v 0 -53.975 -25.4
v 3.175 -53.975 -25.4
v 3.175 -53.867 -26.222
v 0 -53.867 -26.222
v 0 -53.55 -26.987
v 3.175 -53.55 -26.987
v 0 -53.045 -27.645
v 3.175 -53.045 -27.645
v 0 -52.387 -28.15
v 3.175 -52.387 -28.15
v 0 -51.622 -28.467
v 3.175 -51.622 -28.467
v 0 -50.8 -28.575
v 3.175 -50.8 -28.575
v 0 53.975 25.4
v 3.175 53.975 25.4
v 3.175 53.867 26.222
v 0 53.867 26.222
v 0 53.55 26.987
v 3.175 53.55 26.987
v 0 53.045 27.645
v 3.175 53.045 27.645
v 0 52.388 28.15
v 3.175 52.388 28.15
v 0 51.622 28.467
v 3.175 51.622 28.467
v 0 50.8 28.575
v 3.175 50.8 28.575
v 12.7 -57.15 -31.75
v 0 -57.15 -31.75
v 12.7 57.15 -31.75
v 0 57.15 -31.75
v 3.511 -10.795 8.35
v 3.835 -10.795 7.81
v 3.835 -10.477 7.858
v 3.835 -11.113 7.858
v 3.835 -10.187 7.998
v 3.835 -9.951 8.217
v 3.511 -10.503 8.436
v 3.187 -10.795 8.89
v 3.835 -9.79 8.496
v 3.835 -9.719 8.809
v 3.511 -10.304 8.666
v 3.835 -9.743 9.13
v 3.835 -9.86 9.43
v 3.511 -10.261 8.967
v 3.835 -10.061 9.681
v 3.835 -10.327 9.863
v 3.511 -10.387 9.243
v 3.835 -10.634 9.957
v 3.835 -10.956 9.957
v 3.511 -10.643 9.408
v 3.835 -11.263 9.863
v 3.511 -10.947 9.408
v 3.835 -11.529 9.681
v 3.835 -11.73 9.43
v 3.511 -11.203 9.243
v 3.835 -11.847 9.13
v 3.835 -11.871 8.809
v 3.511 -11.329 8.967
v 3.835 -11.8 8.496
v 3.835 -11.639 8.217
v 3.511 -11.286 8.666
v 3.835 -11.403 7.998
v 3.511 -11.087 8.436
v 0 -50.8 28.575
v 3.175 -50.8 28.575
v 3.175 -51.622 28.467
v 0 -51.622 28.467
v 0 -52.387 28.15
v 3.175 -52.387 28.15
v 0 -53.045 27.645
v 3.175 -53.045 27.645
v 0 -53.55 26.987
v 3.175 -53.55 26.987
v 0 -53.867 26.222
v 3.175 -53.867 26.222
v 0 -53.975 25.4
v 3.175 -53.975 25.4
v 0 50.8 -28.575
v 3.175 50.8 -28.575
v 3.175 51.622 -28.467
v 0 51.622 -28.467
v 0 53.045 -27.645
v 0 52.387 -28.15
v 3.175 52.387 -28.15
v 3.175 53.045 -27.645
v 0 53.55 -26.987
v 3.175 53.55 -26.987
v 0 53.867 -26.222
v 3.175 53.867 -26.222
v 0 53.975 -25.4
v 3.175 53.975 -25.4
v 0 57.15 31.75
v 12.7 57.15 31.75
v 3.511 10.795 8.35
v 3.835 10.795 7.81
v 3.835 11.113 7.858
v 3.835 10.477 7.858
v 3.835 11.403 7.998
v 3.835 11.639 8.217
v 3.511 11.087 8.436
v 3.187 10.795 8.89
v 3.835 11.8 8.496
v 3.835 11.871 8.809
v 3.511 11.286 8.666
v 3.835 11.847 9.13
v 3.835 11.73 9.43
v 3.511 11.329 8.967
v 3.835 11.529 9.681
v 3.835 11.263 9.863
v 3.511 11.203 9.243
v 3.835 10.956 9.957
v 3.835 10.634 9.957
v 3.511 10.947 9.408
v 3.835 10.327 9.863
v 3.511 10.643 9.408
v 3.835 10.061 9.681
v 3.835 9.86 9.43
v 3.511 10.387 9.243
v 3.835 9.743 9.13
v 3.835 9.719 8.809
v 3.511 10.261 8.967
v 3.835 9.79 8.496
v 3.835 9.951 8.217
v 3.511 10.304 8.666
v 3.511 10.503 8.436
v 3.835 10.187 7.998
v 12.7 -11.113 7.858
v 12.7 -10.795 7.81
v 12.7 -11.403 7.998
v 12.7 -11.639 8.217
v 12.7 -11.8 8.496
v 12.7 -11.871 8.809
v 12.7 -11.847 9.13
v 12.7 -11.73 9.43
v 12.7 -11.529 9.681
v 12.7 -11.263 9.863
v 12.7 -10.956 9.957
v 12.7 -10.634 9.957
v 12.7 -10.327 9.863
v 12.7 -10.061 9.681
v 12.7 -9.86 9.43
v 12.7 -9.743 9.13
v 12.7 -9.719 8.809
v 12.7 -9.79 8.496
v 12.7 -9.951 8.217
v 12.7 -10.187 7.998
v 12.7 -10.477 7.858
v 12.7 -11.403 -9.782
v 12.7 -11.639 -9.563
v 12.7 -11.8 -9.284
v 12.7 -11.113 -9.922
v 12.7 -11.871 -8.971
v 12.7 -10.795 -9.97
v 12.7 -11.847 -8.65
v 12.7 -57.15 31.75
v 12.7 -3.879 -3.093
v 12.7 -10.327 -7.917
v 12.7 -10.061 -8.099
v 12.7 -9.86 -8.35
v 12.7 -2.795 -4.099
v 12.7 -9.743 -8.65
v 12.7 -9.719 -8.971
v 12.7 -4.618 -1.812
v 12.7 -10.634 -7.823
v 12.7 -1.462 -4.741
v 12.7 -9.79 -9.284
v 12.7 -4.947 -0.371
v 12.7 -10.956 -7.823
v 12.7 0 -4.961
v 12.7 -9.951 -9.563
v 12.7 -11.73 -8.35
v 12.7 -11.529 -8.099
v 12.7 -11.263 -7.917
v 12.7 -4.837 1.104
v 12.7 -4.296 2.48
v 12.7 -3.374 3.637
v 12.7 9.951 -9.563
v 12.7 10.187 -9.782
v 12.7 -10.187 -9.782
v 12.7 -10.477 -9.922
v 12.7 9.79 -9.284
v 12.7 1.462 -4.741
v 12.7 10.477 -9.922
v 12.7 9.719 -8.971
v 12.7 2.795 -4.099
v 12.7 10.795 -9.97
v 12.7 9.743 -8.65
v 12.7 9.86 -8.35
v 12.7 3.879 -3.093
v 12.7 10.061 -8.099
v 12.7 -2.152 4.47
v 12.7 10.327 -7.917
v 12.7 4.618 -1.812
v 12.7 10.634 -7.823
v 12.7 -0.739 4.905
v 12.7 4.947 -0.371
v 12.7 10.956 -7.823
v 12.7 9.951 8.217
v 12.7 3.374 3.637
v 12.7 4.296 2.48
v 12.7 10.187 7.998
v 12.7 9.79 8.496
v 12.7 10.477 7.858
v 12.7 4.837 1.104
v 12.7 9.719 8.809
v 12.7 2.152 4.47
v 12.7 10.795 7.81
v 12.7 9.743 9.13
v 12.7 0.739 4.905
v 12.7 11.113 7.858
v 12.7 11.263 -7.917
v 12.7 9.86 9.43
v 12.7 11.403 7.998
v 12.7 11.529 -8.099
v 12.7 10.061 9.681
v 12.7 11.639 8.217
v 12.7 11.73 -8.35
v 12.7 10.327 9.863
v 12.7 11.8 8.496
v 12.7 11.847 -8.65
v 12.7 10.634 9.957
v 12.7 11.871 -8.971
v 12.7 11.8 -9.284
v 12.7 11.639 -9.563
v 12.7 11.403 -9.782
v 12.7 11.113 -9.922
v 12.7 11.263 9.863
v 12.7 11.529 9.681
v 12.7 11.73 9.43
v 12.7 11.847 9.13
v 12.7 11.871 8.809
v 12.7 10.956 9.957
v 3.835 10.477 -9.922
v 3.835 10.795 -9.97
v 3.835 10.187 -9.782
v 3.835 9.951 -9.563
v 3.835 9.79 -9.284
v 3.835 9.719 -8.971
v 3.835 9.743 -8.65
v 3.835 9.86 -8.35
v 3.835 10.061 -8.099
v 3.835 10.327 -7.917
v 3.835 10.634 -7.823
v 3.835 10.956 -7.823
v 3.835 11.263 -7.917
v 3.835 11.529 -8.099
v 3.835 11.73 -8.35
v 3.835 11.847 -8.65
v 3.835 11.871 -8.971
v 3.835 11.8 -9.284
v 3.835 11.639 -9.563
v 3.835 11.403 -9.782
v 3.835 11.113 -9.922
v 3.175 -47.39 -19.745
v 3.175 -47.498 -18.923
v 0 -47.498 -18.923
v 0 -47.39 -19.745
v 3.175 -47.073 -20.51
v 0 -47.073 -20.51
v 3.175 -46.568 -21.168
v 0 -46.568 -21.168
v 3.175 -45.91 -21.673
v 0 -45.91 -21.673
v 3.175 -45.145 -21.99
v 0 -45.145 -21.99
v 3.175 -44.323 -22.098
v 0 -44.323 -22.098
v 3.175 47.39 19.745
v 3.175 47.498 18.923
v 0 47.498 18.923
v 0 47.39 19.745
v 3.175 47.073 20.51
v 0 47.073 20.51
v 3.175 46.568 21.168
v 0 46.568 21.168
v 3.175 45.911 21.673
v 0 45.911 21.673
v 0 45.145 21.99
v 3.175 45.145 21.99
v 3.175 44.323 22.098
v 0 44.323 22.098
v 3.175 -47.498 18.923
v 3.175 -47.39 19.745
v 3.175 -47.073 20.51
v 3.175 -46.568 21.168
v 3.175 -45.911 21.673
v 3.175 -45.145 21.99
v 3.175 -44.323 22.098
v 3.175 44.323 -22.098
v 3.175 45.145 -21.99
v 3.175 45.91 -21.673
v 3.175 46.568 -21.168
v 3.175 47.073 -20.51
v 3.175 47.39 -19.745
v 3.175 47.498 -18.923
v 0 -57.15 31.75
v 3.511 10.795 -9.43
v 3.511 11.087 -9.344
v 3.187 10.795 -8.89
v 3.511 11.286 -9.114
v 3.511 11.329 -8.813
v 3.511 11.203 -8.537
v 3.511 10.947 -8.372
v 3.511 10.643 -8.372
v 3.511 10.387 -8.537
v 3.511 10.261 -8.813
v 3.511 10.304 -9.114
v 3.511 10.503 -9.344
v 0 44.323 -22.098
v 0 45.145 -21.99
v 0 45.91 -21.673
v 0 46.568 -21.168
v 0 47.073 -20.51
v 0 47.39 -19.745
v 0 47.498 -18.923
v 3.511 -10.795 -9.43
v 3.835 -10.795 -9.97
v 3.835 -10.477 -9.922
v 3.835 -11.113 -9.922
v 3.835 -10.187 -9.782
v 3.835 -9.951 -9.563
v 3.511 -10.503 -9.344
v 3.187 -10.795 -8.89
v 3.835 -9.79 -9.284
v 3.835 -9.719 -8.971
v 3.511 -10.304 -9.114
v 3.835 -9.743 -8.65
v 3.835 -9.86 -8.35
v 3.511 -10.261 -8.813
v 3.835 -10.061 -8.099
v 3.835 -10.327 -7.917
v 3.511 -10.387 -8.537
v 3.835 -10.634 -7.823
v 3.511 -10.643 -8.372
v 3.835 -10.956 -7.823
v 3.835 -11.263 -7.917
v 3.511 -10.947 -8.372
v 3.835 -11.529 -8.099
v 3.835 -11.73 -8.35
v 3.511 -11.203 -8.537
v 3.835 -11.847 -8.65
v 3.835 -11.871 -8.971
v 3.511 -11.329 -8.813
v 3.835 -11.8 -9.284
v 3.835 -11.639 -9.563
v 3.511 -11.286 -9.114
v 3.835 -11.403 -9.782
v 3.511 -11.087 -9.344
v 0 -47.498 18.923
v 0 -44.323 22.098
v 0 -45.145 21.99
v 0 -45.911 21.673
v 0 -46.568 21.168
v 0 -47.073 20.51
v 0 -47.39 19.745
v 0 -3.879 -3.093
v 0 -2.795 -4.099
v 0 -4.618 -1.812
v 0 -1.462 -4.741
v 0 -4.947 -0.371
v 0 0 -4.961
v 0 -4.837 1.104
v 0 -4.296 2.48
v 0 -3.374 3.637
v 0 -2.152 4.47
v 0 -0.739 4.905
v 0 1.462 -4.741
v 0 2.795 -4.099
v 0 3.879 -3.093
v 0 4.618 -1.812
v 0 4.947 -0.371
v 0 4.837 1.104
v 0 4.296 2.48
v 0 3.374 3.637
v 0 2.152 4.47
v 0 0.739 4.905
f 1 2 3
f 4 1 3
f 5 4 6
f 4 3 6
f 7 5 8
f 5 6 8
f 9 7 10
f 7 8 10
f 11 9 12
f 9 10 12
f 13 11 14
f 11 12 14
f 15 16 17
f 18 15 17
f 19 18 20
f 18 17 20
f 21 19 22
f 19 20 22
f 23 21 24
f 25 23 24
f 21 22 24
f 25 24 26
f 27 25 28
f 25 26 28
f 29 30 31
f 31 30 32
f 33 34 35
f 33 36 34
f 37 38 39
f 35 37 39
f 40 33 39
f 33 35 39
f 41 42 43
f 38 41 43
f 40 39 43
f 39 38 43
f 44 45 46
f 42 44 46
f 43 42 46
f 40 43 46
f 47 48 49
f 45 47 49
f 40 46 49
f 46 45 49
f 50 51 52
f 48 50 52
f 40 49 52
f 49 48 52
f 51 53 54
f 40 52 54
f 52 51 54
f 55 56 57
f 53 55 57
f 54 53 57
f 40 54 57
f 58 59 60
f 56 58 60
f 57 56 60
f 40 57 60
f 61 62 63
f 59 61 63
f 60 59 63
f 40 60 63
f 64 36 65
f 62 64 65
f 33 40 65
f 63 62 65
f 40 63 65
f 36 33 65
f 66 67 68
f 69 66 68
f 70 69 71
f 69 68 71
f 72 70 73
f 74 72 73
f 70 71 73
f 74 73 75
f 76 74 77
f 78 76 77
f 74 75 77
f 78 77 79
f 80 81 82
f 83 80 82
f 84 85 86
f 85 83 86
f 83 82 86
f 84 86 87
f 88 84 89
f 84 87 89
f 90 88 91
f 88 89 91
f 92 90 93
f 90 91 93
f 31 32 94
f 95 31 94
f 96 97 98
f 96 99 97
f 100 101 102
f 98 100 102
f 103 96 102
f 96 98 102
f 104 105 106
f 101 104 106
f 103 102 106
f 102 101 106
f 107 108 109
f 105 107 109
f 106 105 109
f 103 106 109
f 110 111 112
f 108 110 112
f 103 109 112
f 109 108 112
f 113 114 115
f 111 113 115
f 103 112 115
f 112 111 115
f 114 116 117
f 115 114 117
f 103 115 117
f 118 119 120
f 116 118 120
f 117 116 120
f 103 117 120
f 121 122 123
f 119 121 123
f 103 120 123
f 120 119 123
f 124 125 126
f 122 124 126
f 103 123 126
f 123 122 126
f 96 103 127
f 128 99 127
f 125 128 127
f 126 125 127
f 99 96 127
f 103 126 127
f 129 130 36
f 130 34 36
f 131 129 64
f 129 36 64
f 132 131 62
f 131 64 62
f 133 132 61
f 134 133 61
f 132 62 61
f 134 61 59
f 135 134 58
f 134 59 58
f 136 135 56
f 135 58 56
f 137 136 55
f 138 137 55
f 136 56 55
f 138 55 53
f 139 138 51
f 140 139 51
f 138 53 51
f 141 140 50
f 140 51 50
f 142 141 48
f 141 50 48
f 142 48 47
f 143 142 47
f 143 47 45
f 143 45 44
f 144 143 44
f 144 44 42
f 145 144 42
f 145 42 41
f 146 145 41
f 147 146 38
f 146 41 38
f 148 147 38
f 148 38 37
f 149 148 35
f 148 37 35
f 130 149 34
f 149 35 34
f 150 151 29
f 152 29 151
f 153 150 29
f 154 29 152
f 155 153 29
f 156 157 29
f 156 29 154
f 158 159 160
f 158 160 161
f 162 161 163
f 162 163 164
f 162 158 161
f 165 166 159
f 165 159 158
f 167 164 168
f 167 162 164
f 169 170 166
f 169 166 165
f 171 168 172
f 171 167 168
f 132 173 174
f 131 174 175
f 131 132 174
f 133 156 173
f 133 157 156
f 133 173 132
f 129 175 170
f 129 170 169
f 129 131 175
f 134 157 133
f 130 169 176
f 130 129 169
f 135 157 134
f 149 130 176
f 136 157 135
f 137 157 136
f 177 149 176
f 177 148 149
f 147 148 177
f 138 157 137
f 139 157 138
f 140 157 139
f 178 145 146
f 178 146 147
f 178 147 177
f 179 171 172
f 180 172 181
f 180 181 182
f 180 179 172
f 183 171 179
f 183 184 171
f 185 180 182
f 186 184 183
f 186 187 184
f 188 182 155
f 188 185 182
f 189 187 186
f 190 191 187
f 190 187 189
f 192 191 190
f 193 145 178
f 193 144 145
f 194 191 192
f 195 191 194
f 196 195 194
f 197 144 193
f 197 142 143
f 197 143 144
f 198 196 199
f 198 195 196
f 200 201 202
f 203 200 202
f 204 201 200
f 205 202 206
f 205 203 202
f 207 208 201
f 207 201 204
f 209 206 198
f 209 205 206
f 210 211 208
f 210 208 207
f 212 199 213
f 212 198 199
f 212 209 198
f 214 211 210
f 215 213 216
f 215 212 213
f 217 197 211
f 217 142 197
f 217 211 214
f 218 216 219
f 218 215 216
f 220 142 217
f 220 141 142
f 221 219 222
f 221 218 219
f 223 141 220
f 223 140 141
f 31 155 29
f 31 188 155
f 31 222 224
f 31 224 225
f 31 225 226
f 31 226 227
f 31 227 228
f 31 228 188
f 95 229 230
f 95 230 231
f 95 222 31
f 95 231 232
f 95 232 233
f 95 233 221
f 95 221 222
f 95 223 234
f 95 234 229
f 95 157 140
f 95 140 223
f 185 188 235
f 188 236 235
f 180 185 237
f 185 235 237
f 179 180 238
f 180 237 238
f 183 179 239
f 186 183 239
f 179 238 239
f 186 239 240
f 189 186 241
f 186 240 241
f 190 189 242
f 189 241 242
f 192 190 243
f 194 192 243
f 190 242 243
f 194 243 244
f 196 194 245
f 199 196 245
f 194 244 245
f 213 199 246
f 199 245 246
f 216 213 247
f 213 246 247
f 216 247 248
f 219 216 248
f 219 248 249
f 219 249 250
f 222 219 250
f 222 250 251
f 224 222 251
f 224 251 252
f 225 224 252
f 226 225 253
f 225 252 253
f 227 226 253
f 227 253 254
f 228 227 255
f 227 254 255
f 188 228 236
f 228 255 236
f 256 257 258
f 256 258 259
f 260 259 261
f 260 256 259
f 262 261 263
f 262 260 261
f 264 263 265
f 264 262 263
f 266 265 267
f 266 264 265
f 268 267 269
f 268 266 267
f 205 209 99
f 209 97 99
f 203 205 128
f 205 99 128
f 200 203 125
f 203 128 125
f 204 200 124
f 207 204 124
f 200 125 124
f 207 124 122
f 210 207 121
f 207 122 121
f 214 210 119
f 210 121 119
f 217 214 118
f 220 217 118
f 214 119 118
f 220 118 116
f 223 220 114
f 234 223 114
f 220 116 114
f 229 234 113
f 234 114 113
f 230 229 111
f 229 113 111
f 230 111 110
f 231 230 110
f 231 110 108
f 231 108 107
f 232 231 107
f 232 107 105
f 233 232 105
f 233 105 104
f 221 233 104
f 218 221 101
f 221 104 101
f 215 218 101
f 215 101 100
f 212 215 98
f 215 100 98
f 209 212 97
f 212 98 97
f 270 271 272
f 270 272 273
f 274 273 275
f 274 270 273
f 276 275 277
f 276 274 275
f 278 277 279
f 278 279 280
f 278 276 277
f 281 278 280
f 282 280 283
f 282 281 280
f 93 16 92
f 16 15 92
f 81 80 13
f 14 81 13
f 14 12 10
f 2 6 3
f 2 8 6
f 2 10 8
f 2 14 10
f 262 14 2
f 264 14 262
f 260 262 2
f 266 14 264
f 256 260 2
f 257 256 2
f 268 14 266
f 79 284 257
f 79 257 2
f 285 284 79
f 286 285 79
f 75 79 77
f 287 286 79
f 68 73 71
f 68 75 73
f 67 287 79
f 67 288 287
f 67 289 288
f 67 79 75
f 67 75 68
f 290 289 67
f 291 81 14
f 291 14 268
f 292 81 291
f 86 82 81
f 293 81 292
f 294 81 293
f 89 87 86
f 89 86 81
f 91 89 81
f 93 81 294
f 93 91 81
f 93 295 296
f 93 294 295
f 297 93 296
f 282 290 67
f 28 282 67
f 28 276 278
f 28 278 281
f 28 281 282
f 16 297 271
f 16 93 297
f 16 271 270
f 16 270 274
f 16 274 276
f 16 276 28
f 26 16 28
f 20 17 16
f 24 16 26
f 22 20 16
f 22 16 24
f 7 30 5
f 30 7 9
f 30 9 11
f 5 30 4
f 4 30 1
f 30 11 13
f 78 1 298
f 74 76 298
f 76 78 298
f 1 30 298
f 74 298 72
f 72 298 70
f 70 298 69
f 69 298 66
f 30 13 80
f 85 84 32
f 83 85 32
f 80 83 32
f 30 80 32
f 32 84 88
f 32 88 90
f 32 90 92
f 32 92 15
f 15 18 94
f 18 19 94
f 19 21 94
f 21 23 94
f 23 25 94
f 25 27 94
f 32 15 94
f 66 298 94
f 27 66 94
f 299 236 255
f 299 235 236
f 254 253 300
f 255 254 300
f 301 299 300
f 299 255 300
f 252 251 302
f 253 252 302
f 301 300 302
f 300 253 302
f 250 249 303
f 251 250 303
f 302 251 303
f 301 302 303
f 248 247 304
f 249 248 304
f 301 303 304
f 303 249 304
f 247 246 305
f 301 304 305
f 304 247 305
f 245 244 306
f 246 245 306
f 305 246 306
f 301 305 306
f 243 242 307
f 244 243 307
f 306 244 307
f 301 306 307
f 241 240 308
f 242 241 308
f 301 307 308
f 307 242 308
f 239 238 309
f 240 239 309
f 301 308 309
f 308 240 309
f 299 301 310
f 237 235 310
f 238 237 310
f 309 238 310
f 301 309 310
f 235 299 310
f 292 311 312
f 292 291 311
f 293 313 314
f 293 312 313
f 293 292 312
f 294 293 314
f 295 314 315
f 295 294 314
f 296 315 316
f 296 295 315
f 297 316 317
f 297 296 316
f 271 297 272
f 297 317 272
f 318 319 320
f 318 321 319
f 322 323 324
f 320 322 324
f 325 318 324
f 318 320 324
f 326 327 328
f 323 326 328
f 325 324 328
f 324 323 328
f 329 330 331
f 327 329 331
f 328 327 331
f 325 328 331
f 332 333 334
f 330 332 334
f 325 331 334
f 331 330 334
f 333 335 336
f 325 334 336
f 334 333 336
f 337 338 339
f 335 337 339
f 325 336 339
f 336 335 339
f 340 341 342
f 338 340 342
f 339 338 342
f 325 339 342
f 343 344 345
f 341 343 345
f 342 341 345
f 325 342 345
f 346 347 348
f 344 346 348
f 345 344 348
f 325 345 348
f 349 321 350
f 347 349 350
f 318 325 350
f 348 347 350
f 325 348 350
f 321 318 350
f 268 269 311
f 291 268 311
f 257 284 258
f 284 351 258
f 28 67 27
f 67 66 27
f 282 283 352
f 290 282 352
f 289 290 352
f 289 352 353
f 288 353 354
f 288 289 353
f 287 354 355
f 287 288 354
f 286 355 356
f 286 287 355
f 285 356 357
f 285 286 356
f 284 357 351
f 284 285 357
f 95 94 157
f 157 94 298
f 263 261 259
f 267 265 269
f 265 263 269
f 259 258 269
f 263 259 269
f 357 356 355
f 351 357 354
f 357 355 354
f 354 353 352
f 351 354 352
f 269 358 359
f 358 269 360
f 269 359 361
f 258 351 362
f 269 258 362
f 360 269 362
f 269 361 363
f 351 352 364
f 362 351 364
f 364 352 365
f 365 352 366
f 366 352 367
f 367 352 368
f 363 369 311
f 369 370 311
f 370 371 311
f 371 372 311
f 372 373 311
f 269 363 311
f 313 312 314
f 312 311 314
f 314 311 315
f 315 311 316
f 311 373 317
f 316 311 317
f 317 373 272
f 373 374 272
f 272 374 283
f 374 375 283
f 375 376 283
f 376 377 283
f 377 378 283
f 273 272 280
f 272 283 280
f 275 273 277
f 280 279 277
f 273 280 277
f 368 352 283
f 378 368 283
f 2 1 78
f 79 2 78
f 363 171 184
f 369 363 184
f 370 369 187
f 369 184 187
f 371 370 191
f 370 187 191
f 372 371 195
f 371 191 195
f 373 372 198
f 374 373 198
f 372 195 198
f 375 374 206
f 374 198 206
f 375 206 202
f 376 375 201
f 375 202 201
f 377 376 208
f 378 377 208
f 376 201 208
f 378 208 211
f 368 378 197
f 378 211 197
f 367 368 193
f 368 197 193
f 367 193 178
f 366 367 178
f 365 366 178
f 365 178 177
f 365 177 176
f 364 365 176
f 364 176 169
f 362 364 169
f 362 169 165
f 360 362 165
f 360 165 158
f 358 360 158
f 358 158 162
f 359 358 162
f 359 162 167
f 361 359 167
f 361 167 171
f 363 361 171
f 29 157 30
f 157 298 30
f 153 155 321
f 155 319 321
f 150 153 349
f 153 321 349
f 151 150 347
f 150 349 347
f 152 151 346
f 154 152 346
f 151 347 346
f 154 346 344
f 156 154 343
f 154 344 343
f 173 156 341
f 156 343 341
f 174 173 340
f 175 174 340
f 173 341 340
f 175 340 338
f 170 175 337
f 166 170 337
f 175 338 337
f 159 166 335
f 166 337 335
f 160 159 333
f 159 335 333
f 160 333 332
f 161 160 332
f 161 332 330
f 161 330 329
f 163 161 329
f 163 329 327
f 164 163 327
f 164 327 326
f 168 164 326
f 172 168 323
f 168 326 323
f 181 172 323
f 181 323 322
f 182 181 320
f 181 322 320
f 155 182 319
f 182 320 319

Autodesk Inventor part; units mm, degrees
ref_plane "YZ Plane" through (0, 0, 0) normal (1, 0, 0) x (0, 1, 0)
ref_plane "XZ Plane" through (0, 0, 0) normal (0, 1, 0) x (-1, 0, 0)
ref_plane "XY Plane" through (0, 0, 0) normal (0, 0, 1) x (1, 0, 0)
sketch "Sketch1" plane through (0, 0, 0) normal (1, 0, 0) x (0, 1, 0)
  line L0 (57.15, 31.75) -> (-57.15, 31.75)
  line L1 (-57.15, 31.75) -> (-57.15, -31.75)
  line L2 (-57.15, -31.75) -> (57.15, -31.75)
  line L3 (57.15, -31.75) -> (57.15, 31.75)
  line L4 (-50.8, 25.4) -> (50.8, 25.4)
  line L5 (50.8, 25.4) -> (50.8, -25.4)
  line L6 (50.8, -25.4) -> (-50.8, -25.4)
  line L7 (-50.8, -25.4) -> (-50.8, 25.4)
  point P0 (0, 0)
  point P1 (0, -31.75)
  point P2 (57.15, 0)
  point P3 (0, 25.4)
  point P4 (-50.8, 0)
  dimension "d0" = 63.5
  dimension "d1" = 114.3
  dimension "d14" = 50.8
  dimension "d15" = 101.6
extrude "Extrusion1" add sketch "Sketch1" along normal blind 12.7 contours L3 L2 L1 L0 | L4 L5 L6 L7
sketch "Sketch2" plane through (12.7, 0, 0) normal (1, 0, 0) x (0, 0, -1)
  line L0 (-8.89, -10.795) -> (8.89, 10.795) construction
  line L1 (-8.89, 10.795) -> (8.89, -10.795) construction
  circle A0 centre (0, 0) radius 4.9609
  dimension "d5" = 21.59
  dimension "d12" = 9.9219
  dimension "d13" = 17.78
sketch "Sketch3" plane through (0, 0, 0) normal (-1, 0, 0) x (0, 0, 1)
  line L0 (-28.575, -53.975) -> (28.575, -53.975)
  line L1 (28.575, -53.975) -> (28.575, 53.975)
  line L2 (28.575, 53.975) -> (-28.575, 53.975)
  line L3 (-28.575, 53.975) -> (-28.575, -53.975)
  line L4 (22.098, 47.498) -> (22.098, -47.498)
  line L5 (22.098, -47.498) -> (-22.098, -47.498)
  line L6 (-22.098, -47.498) -> (-22.098, 47.498)
  line L7 (-22.098, 47.498) -> (22.098, 47.498)
  point P0 (0, 0)
  point P1 (0, -53.975)
  point P2 (-28.575, 0)
  point P3 (0, 0)
  point P4 (28.575, 0)
  point P5 (0, 53.975)
  dimension "d16" = 107.95
  dimension "d17" = 57.15
  dimension "d31" = 6.477
extrude "Extrusion3" cut sketch "Sketch3" against normal blind 3.175
extrude "Extrusion4" cut sketch "Sketch2" against normal through all
hole "Hole1" at (12.7, -10.795, 8.89) at (12.7, 10.795, 8.89) at (12.7, 10.795, -8.89) at (12.7, -10.795, -8.89) direction (-1, 0, 0) diameter 2.159 depth 8.8646 tip angle 118
fillet "Fillet1" radius 3.175 8 edges at (1.5875, 53.975, 28.575) (1.5875, -47.498, 22.098) (1.5875, -47.498, -22.098) (1.5875, -53.975, -28.575) (1.5875, 47.498, -22.098) (1.5875, -53.975, 28.575) (1.5875, 53.975, -28.575) (1.5875, 47.498, 22.098)
properties part number "plate" material "Aluminum 6061"
